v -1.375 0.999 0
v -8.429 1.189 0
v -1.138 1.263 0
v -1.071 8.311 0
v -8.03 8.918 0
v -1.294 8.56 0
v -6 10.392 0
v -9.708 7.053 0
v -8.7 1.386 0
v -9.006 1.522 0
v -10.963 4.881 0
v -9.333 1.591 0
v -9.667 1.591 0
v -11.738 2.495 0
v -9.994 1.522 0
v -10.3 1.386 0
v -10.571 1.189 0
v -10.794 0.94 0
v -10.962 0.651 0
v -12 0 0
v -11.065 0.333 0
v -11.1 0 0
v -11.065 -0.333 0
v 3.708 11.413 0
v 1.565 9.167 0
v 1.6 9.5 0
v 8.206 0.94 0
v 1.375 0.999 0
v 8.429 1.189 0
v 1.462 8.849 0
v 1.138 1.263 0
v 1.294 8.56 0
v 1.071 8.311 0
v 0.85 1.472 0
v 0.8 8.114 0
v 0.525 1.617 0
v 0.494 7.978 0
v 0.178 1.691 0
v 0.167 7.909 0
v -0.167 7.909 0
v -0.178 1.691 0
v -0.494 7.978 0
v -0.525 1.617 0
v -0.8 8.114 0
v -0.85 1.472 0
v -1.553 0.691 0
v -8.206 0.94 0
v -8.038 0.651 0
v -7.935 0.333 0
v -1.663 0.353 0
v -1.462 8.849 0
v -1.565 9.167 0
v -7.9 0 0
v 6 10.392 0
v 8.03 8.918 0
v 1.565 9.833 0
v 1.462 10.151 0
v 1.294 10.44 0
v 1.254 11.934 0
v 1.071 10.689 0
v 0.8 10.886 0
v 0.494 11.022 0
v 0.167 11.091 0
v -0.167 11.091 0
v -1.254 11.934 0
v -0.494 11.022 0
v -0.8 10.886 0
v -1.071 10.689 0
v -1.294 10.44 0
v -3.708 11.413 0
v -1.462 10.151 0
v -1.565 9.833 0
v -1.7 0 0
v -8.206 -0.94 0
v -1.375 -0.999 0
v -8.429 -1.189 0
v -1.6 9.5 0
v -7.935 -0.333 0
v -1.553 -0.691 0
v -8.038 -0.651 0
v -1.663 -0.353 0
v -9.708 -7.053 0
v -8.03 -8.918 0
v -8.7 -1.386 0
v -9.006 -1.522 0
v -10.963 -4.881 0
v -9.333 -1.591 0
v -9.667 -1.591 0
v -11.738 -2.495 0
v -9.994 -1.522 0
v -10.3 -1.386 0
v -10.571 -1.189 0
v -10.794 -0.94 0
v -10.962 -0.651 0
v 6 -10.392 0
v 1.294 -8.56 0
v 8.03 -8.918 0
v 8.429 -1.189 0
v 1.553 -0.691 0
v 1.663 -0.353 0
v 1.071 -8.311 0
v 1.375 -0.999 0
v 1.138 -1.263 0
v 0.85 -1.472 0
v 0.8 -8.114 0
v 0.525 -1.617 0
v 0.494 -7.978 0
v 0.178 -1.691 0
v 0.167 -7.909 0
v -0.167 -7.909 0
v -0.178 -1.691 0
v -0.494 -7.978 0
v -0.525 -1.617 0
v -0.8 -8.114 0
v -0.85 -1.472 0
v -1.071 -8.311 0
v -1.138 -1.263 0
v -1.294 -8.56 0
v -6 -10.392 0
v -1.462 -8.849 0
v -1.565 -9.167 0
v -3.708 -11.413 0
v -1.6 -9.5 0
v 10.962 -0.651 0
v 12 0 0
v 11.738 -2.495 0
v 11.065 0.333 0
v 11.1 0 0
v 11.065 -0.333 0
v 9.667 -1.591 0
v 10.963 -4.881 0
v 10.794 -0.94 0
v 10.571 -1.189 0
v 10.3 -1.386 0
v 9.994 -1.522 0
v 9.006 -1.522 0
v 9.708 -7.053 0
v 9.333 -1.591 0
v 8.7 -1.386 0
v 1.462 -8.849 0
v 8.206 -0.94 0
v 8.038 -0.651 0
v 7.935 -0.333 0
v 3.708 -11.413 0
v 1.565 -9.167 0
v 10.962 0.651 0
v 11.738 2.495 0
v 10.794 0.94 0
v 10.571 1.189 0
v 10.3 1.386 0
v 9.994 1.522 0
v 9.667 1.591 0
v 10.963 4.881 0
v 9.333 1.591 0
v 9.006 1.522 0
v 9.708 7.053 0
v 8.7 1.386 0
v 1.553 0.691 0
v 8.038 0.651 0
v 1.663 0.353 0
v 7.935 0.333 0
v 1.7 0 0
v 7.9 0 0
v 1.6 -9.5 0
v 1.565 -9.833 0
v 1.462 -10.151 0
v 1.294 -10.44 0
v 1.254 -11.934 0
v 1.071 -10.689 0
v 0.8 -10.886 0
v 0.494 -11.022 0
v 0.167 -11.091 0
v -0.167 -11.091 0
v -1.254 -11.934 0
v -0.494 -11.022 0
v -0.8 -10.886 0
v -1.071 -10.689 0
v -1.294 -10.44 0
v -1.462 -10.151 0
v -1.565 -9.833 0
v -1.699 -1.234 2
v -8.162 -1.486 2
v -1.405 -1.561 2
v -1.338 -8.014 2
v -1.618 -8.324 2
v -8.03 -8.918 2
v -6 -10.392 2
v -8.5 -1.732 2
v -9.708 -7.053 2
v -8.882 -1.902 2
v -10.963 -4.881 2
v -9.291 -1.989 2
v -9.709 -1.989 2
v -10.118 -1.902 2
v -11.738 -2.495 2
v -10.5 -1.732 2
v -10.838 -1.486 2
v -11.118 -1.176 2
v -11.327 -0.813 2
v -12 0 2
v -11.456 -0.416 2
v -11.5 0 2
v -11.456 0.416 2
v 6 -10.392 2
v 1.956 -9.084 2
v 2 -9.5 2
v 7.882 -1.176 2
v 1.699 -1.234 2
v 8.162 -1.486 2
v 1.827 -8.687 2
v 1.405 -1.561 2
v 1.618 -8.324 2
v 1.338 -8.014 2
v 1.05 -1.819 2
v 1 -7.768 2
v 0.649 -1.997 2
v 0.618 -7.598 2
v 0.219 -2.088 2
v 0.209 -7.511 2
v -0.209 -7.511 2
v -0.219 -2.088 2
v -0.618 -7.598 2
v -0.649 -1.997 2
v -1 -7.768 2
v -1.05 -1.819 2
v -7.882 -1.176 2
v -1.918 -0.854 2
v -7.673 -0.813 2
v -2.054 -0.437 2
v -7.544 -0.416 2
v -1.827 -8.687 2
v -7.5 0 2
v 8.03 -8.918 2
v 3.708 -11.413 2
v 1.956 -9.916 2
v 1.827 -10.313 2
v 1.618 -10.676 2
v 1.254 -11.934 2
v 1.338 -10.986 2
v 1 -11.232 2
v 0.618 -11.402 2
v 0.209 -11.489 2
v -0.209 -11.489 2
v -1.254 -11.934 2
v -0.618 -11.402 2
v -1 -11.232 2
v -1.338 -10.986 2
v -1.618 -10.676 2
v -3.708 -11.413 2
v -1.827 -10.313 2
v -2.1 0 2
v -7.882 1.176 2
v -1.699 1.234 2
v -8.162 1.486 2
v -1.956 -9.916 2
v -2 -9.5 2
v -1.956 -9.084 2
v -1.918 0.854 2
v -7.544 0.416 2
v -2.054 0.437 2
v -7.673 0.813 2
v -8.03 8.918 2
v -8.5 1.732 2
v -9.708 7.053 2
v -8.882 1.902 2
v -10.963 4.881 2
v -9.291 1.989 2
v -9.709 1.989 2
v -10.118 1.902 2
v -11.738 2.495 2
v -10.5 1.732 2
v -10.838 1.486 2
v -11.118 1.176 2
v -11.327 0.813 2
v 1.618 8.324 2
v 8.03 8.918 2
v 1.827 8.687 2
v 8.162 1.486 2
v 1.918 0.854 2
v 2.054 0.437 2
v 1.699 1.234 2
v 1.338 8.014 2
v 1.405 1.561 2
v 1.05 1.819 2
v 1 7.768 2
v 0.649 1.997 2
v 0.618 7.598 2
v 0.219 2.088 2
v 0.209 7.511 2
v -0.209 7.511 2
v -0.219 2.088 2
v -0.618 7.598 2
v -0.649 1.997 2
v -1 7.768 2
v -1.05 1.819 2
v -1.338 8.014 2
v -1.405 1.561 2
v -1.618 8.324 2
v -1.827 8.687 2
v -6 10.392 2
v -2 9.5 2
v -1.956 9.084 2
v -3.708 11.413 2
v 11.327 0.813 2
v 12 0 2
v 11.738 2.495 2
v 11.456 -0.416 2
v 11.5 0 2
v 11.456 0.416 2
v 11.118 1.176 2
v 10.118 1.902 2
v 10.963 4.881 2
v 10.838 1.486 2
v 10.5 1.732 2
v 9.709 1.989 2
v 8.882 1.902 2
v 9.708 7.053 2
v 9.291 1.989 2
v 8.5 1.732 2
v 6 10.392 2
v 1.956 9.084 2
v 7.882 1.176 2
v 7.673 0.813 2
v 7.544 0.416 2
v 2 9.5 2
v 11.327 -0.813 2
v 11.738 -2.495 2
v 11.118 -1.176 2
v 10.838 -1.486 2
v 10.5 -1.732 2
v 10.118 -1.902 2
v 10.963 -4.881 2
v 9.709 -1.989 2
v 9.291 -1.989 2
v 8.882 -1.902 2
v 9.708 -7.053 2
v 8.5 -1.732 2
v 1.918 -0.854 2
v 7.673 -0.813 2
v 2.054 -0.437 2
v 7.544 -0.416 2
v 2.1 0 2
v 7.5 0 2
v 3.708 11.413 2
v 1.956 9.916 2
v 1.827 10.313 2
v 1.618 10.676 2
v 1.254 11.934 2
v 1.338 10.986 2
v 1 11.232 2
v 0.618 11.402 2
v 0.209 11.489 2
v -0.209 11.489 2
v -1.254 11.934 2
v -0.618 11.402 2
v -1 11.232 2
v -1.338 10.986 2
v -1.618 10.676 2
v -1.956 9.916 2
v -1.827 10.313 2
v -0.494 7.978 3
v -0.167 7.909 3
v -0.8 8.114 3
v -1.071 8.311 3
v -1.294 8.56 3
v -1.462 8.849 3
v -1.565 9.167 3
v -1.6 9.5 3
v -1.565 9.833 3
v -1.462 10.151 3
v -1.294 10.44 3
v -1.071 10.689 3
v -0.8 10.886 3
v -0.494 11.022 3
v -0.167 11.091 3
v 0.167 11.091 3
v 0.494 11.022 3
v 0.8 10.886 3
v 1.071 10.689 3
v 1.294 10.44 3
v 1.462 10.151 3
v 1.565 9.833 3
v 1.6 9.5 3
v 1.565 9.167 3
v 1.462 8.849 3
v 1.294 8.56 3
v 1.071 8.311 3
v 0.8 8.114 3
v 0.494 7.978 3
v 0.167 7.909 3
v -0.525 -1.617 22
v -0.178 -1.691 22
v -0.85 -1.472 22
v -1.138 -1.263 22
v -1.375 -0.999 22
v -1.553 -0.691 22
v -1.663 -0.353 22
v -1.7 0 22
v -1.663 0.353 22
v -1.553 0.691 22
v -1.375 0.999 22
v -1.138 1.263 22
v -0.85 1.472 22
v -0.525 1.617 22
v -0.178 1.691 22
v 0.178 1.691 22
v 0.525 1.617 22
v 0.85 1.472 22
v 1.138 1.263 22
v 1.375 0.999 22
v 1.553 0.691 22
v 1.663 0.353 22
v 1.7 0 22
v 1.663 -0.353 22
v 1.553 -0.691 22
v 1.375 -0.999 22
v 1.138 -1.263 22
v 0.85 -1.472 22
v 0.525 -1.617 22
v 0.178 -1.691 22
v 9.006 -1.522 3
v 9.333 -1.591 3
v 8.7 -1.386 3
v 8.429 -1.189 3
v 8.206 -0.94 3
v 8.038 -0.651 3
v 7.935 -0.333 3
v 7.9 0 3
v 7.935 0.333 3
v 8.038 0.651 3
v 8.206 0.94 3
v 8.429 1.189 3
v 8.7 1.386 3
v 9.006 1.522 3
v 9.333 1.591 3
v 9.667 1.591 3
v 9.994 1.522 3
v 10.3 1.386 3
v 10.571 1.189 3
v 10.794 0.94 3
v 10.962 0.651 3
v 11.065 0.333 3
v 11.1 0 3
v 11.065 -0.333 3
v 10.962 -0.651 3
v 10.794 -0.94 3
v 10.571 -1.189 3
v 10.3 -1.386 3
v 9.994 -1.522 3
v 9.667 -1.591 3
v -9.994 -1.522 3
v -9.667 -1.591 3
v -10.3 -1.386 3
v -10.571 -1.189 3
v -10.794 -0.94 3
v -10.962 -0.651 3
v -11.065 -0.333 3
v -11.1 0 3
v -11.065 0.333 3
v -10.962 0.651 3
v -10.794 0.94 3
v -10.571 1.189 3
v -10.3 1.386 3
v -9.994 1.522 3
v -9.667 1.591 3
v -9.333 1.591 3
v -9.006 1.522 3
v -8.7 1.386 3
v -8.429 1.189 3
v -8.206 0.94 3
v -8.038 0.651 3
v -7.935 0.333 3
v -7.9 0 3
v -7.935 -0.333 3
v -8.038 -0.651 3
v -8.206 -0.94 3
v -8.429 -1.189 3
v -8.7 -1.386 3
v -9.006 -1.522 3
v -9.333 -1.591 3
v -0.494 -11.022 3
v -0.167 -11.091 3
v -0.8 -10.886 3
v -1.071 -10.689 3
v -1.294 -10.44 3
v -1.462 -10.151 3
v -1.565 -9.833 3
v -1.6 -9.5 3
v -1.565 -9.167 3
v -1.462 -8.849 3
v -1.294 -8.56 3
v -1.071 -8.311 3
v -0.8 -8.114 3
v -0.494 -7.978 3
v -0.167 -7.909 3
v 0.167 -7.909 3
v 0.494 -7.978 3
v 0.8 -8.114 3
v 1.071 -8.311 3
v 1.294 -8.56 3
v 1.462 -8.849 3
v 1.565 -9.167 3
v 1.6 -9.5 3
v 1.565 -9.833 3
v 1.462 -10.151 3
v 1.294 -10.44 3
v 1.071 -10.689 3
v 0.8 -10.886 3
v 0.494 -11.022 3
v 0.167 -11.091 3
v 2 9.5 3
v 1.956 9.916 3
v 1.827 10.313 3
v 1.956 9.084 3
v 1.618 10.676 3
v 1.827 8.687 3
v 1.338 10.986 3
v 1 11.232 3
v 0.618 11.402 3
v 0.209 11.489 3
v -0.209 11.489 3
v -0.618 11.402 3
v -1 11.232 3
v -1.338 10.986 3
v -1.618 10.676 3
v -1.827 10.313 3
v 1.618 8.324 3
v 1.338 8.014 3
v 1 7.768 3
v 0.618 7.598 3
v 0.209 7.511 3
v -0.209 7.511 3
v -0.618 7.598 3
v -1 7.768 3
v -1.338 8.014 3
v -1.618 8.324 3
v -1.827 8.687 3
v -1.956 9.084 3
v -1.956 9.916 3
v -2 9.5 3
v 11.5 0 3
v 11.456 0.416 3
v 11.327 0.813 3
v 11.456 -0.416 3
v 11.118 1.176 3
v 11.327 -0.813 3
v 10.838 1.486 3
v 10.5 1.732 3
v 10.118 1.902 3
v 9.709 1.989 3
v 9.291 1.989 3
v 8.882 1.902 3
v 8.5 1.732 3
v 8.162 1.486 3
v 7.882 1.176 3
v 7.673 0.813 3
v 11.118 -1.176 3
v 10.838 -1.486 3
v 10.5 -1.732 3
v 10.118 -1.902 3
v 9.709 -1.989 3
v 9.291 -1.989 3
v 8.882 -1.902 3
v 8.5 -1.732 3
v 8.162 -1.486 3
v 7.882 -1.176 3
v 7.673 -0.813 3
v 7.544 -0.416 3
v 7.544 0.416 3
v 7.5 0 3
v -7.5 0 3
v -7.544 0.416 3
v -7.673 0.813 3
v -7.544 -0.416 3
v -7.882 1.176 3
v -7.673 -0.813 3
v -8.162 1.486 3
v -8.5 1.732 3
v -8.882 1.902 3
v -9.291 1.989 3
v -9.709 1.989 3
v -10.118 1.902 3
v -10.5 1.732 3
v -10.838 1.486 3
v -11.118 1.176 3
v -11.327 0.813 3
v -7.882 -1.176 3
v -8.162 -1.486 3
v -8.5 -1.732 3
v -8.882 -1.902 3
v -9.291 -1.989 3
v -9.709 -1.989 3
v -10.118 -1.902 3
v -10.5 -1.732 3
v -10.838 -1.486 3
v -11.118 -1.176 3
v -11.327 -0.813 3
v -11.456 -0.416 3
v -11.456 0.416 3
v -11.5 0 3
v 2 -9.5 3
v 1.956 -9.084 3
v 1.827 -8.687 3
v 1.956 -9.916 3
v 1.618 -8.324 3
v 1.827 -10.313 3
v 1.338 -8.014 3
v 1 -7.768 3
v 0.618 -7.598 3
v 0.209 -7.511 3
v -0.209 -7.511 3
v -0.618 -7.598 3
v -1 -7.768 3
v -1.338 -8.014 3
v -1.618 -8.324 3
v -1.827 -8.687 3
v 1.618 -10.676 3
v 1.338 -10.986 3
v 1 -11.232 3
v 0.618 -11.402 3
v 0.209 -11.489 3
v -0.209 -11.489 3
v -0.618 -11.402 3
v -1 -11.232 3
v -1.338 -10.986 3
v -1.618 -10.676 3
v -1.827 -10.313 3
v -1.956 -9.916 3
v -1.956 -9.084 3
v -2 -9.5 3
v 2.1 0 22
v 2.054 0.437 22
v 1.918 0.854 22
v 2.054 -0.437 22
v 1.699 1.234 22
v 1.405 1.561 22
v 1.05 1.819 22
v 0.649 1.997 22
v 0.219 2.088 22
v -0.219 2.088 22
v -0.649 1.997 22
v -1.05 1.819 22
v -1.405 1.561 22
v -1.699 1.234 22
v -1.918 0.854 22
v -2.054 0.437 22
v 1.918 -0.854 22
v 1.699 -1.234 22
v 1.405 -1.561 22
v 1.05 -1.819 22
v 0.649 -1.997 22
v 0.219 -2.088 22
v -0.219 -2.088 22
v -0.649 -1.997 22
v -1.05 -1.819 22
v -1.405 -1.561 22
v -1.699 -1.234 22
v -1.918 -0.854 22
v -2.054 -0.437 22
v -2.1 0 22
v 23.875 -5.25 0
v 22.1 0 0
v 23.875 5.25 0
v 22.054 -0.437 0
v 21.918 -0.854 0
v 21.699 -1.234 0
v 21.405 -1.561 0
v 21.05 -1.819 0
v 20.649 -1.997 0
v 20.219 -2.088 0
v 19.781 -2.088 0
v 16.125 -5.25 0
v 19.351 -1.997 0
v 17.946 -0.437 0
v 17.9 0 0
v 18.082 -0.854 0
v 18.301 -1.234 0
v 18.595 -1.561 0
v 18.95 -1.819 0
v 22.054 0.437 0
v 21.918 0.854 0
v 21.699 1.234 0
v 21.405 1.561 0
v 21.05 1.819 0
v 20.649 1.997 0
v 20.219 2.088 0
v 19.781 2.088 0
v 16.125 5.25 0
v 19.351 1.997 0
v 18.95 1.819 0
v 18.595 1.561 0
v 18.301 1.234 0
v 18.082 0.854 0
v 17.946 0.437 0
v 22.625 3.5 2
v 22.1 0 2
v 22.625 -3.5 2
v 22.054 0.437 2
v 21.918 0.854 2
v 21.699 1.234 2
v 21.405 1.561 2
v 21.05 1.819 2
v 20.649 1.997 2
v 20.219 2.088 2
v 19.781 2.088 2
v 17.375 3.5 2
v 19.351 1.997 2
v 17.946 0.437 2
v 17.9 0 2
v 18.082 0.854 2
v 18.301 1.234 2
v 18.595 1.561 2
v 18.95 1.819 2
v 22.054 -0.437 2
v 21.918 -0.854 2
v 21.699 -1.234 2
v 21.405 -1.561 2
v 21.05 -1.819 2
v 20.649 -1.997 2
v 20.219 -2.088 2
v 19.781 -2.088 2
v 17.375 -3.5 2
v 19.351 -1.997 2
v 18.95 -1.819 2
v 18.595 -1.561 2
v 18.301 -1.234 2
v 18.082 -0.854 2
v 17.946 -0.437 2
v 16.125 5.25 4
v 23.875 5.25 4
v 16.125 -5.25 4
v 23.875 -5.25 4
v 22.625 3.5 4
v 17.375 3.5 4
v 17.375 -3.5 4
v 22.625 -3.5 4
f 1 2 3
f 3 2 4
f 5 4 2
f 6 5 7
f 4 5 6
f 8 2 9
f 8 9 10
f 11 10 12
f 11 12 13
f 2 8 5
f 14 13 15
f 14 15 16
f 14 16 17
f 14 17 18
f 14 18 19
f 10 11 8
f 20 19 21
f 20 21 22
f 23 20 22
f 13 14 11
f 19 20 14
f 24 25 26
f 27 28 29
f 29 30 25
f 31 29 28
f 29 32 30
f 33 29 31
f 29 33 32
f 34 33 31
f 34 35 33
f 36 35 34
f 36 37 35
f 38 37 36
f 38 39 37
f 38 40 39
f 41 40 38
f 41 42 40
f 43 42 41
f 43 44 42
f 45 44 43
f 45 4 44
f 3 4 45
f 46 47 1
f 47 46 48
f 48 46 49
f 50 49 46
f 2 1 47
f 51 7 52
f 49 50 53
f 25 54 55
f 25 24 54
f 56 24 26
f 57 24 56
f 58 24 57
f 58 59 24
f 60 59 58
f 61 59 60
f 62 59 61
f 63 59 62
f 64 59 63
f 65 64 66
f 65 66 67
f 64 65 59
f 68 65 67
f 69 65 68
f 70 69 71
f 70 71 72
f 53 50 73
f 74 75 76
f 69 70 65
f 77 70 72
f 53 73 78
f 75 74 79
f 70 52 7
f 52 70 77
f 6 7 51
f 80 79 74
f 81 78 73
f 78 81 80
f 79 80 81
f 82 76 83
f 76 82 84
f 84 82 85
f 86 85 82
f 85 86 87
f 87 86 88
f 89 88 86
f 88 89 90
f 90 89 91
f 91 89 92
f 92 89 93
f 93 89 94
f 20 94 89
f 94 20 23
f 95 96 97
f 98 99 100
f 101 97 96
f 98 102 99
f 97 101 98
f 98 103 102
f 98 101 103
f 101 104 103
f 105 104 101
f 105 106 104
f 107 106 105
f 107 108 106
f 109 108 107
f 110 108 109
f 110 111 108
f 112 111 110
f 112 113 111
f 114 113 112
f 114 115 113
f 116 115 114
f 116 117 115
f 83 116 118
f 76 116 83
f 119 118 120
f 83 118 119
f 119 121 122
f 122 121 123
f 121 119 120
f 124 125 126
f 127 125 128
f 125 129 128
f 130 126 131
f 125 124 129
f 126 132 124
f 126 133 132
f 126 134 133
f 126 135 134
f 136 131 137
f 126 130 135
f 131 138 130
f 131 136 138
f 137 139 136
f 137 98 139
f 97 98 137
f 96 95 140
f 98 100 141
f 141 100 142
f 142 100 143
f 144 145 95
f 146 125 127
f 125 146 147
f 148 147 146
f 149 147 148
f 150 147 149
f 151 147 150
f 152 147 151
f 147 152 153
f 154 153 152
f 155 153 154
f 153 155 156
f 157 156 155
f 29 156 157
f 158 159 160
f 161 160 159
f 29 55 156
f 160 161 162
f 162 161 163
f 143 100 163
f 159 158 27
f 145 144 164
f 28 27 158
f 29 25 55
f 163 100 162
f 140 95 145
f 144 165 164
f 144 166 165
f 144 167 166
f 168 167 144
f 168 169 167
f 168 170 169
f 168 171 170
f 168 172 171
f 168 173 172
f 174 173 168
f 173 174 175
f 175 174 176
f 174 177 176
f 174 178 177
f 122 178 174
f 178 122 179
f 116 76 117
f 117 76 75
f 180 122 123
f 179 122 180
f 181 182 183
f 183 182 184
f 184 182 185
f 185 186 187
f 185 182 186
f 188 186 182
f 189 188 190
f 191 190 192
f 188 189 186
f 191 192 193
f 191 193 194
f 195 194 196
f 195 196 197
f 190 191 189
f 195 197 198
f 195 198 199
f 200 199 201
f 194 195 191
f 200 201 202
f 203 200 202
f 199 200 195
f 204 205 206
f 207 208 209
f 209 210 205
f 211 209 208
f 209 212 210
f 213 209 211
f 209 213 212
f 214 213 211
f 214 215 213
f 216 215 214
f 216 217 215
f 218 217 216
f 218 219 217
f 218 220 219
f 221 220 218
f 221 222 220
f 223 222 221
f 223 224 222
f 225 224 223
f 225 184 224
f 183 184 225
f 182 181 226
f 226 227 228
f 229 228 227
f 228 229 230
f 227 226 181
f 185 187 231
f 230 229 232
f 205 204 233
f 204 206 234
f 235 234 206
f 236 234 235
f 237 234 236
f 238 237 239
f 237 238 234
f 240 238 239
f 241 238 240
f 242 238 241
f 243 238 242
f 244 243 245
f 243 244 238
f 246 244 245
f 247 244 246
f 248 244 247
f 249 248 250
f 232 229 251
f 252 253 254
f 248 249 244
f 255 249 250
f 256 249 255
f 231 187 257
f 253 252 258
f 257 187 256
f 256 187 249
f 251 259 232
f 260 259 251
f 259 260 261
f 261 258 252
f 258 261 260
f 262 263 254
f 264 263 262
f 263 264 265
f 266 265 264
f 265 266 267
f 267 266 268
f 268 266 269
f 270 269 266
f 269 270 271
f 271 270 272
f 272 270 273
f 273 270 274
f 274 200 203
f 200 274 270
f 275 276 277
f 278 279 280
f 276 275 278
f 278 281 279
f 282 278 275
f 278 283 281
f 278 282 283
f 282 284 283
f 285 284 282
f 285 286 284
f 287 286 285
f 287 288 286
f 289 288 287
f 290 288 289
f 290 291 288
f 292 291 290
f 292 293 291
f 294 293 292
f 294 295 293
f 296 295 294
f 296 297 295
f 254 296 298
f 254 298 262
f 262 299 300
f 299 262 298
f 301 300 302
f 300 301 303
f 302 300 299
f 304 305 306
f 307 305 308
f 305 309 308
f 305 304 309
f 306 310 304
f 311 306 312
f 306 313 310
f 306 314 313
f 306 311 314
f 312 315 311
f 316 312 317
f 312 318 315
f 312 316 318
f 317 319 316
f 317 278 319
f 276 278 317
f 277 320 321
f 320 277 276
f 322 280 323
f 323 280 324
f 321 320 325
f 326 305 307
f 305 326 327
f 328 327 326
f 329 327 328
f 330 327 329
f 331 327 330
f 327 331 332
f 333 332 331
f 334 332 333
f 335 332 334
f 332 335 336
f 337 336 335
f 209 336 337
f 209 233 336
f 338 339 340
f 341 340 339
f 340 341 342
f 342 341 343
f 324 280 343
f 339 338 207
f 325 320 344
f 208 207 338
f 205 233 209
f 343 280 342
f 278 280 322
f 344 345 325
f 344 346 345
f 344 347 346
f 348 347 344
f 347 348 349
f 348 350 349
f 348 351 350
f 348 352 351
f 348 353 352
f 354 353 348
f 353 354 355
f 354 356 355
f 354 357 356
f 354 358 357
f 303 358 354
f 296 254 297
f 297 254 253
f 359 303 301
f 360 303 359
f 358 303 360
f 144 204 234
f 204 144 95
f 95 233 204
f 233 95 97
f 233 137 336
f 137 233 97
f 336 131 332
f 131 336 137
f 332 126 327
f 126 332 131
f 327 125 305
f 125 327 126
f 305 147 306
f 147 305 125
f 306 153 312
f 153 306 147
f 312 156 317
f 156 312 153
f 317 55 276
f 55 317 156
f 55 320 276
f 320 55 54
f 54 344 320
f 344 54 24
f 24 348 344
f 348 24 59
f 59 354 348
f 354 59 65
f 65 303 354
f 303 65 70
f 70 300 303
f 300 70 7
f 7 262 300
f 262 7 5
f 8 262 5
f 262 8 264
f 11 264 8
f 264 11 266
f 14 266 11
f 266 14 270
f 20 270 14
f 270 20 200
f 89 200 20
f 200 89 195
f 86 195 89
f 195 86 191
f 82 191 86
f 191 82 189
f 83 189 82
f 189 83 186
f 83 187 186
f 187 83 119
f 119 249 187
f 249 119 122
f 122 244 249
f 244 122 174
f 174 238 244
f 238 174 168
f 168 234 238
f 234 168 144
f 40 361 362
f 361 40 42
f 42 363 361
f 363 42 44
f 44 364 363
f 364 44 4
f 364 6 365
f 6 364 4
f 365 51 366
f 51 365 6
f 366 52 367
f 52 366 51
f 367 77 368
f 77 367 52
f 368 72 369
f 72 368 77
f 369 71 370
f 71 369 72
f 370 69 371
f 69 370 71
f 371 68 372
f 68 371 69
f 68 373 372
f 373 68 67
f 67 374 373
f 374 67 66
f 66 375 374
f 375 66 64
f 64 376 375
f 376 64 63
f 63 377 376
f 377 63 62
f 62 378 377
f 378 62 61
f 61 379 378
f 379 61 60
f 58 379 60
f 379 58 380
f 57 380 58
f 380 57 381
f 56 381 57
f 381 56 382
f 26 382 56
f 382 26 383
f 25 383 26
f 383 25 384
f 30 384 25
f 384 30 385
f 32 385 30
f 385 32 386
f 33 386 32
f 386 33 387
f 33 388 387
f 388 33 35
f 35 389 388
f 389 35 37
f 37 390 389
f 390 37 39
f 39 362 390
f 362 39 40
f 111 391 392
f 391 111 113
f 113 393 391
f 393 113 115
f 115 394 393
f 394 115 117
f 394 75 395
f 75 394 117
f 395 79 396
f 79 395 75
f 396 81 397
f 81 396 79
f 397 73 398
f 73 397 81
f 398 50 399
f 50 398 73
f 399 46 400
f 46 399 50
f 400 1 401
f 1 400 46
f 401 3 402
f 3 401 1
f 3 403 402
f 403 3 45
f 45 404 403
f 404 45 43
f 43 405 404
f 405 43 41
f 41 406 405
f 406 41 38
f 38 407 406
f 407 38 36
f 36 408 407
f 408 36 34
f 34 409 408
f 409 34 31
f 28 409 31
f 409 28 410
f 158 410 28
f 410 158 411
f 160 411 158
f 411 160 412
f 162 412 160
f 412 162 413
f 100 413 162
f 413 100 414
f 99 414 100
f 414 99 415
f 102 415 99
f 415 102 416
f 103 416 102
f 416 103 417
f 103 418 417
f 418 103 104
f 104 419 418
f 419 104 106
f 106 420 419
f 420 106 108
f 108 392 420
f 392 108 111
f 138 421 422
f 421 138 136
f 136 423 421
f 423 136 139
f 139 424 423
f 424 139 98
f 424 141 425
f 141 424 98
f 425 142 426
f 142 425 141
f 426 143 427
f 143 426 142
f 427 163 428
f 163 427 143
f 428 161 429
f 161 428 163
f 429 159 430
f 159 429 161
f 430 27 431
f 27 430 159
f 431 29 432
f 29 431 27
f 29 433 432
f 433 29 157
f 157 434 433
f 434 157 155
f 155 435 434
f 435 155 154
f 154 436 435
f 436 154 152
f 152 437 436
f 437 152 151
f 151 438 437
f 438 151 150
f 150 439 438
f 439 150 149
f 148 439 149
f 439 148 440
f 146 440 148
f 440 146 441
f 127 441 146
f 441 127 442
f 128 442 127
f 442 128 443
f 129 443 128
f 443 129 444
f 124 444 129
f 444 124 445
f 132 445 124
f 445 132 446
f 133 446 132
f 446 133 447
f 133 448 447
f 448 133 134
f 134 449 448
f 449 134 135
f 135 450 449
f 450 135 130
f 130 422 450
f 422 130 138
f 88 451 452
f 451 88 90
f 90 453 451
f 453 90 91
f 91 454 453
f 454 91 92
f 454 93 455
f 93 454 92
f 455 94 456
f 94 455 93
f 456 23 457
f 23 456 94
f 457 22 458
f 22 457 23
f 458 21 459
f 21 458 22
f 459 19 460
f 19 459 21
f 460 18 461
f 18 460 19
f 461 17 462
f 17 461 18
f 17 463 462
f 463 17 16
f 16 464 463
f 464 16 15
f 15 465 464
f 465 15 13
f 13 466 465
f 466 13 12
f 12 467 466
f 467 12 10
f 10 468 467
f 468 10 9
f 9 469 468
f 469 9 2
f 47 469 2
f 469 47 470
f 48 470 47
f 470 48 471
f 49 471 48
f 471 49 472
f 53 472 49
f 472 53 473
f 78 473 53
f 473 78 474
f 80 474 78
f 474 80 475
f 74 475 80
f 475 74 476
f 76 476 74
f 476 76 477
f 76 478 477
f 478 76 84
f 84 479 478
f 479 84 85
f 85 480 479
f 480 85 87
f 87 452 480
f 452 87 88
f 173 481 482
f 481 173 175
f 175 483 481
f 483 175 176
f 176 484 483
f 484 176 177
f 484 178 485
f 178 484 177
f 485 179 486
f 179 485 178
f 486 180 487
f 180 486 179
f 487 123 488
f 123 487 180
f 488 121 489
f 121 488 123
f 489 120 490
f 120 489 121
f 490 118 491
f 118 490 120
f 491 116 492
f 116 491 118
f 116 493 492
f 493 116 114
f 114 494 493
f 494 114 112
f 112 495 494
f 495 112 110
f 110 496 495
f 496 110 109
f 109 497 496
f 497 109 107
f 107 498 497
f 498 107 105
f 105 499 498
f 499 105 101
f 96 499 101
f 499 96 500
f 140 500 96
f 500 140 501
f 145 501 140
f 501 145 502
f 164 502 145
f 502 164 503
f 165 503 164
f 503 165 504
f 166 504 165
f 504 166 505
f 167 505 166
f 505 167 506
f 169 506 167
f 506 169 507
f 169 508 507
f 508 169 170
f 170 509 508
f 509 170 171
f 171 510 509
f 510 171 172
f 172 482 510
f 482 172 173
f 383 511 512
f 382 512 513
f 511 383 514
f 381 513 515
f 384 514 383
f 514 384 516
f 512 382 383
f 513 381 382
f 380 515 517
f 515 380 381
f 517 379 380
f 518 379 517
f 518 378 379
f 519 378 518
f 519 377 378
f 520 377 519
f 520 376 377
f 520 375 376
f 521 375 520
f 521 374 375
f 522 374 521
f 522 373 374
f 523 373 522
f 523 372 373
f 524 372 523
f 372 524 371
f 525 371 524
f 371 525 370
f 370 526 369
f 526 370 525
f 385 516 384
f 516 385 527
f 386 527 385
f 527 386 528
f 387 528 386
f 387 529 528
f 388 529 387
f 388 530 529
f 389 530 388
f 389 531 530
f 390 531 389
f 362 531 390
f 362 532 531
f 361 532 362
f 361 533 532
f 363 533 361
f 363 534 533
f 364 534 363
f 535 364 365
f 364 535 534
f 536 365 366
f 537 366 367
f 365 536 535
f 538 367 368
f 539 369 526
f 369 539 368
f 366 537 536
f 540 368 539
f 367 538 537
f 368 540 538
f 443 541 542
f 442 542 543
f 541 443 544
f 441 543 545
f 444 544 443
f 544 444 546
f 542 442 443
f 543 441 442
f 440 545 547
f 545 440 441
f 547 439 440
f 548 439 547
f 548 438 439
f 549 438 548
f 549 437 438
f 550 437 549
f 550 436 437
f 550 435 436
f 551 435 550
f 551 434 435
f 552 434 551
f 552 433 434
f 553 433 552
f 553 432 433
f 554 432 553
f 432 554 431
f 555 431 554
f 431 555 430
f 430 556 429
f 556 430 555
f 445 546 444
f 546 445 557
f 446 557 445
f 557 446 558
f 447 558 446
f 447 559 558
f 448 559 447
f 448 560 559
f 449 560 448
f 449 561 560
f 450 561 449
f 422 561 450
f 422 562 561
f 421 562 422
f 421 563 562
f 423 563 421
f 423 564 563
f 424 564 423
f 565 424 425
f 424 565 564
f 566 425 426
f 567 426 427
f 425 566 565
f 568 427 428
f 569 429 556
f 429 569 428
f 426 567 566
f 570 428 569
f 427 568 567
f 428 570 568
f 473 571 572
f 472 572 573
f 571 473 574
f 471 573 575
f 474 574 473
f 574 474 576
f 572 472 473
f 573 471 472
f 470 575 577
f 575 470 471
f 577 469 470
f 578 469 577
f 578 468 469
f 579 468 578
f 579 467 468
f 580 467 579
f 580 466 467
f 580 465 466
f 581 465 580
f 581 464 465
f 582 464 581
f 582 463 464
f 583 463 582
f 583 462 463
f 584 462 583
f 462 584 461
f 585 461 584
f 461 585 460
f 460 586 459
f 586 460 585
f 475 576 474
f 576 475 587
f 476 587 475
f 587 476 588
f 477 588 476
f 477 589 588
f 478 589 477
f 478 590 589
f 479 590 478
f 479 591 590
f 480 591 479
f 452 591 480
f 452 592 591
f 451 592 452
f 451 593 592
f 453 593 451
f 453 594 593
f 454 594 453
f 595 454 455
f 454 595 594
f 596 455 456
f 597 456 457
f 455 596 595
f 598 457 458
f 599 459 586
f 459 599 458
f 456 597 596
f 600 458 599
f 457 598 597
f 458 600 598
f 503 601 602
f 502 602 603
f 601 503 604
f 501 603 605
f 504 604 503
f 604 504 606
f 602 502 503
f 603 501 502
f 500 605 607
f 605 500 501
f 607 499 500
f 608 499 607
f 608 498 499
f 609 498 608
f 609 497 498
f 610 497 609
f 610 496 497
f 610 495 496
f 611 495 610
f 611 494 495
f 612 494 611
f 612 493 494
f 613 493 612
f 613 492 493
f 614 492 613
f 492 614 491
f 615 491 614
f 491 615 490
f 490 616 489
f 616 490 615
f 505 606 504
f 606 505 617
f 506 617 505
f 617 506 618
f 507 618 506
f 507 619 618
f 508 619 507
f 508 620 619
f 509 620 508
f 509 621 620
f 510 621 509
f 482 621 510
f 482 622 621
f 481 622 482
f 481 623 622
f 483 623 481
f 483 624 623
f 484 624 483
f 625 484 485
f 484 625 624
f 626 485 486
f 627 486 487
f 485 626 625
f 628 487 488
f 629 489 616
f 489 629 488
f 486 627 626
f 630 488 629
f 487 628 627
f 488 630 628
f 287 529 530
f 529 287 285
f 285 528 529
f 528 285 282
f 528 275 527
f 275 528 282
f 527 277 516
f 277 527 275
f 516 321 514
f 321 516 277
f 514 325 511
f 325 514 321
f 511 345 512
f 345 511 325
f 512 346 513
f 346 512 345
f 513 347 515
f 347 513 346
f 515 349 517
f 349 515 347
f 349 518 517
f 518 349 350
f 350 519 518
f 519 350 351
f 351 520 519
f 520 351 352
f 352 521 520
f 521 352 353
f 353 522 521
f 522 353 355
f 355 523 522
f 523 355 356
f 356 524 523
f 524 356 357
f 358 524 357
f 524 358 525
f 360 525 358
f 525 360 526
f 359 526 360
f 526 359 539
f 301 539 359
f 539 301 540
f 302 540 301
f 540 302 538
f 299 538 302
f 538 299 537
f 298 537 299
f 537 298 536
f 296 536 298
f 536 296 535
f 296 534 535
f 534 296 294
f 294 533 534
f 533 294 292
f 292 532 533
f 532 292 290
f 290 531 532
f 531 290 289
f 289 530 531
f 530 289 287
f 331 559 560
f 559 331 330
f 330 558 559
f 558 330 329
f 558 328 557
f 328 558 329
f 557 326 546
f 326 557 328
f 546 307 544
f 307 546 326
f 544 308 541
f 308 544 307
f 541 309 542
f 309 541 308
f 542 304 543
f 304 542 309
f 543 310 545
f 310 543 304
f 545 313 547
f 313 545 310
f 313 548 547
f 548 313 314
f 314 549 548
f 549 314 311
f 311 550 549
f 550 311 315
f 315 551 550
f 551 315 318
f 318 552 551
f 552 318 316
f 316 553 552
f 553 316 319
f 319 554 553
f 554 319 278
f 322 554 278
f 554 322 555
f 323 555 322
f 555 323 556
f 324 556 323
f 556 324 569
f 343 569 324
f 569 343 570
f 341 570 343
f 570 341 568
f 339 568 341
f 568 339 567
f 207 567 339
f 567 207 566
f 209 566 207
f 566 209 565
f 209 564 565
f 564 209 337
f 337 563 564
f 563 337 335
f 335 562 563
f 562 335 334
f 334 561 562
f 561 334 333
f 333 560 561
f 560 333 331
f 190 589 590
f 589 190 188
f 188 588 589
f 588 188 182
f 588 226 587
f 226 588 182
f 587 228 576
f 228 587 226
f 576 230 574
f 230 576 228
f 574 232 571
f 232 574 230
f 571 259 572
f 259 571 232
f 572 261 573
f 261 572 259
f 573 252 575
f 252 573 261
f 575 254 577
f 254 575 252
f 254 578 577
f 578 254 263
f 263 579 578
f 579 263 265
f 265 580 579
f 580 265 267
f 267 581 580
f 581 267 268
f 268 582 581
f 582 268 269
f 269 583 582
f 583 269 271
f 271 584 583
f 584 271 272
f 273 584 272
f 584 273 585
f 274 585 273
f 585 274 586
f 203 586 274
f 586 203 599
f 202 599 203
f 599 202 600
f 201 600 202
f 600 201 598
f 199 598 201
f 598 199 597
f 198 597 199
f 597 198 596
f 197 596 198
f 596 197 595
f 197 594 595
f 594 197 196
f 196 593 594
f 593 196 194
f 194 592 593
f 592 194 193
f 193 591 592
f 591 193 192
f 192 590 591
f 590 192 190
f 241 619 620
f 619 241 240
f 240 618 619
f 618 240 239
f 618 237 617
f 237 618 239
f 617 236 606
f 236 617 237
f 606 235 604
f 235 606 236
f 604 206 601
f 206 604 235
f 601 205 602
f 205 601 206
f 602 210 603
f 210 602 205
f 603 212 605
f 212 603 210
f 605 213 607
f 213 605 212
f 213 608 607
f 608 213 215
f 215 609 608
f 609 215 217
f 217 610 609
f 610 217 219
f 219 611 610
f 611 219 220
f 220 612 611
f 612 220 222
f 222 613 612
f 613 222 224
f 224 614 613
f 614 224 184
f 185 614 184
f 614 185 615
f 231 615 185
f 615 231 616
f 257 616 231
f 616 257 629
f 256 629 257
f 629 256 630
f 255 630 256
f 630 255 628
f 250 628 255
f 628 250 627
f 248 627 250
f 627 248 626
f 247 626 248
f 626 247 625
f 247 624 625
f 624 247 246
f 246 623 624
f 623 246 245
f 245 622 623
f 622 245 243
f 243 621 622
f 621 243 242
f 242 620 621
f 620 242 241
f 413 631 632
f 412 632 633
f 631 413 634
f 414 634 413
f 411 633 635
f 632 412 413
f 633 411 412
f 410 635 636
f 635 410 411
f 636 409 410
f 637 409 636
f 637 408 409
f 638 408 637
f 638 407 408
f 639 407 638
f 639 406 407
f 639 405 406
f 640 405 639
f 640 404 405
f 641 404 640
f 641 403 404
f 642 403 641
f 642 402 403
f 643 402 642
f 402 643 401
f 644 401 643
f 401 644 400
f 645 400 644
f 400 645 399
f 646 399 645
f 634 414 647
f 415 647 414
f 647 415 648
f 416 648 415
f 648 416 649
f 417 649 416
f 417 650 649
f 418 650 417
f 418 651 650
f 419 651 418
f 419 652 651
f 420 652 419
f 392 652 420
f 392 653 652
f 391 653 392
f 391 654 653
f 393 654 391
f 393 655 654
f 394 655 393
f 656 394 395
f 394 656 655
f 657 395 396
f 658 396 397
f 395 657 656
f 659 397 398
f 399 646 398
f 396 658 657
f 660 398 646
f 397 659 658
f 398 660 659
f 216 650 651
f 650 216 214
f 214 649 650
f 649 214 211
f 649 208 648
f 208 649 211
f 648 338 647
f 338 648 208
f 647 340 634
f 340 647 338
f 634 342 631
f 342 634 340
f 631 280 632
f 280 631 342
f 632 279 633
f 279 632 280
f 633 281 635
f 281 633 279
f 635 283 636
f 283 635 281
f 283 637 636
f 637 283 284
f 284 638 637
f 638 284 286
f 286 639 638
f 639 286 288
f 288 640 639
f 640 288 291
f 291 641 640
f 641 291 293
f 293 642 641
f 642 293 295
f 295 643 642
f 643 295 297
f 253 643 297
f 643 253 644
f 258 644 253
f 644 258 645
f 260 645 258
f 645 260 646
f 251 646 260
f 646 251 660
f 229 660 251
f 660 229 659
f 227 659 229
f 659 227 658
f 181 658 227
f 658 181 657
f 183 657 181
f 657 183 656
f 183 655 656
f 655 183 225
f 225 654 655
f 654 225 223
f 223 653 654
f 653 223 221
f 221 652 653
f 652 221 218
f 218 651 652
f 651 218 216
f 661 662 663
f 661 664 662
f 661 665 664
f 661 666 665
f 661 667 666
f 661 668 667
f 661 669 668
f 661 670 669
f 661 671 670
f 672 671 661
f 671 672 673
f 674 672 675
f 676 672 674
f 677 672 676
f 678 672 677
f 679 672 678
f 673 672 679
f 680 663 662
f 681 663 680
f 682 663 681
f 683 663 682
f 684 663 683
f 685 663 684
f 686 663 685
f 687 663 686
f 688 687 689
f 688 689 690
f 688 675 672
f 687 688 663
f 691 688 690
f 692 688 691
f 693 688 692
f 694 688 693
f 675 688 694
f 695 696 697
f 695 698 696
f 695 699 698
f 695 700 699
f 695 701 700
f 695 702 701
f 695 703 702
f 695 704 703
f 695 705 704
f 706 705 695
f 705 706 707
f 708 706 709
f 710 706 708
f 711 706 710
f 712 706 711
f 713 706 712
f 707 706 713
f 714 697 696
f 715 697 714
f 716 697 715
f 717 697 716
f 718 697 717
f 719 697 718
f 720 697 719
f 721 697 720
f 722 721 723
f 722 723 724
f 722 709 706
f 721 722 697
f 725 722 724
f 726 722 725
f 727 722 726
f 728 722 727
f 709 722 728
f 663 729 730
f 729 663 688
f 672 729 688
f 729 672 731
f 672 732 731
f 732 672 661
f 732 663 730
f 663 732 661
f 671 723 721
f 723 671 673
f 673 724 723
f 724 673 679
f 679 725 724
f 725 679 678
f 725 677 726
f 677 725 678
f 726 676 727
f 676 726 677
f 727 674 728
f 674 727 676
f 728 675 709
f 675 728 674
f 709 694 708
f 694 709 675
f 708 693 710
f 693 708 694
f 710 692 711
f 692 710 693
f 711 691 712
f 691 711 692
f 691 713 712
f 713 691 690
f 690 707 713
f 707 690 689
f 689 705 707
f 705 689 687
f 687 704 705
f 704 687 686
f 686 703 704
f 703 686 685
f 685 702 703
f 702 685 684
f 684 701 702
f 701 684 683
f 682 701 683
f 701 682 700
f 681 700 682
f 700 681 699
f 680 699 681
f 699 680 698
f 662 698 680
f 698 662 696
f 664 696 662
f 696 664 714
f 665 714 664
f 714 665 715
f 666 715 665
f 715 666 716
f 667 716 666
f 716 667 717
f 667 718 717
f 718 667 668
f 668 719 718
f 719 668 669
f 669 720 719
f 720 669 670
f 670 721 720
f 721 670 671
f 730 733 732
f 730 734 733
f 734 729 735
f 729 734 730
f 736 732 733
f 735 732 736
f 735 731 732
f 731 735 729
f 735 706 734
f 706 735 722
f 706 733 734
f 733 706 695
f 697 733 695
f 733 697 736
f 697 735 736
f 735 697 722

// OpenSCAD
$fn=30;


module ic() {
    linear_extrude(height=2) {
        difference() {
            square([7.75, 10.5], center=true);
            circle(d=4.2);
        }
    }
    translate([0, 0, 2]) {
        linear_extrude(height=2) {
            difference() {
                square([7.75, 10.5], center=true);
                square([5.25, 7], center=true);
            }
        }
    }
}

module mountHoles(d=3.2) {
    translate([19/2, 0]) {
        circle(d=d);
    }
    translate([-19/2, 0]) {
        circle(d=d);
    }
    translate([0, 19/2]) {
        circle(d=d);
    }
    translate([0, -19/2]) {
        circle(d=d);
    }
}

module base() {
    linear_extrude(height=2) {
        difference() {
            circle(d=24);
            circle(d=3.4);
            mountHoles();
        }
    }
    linear_extrude(height=3) {
        difference() {
            mountHoles(4);
            mountHoles();
        }
    }
    linear_extrude(height=22) {
        difference() {
            circle(d=4.2);
            circle(d=3.4);
        }
    }
}

base();
translate([20, 0]) {
    ic();
}
